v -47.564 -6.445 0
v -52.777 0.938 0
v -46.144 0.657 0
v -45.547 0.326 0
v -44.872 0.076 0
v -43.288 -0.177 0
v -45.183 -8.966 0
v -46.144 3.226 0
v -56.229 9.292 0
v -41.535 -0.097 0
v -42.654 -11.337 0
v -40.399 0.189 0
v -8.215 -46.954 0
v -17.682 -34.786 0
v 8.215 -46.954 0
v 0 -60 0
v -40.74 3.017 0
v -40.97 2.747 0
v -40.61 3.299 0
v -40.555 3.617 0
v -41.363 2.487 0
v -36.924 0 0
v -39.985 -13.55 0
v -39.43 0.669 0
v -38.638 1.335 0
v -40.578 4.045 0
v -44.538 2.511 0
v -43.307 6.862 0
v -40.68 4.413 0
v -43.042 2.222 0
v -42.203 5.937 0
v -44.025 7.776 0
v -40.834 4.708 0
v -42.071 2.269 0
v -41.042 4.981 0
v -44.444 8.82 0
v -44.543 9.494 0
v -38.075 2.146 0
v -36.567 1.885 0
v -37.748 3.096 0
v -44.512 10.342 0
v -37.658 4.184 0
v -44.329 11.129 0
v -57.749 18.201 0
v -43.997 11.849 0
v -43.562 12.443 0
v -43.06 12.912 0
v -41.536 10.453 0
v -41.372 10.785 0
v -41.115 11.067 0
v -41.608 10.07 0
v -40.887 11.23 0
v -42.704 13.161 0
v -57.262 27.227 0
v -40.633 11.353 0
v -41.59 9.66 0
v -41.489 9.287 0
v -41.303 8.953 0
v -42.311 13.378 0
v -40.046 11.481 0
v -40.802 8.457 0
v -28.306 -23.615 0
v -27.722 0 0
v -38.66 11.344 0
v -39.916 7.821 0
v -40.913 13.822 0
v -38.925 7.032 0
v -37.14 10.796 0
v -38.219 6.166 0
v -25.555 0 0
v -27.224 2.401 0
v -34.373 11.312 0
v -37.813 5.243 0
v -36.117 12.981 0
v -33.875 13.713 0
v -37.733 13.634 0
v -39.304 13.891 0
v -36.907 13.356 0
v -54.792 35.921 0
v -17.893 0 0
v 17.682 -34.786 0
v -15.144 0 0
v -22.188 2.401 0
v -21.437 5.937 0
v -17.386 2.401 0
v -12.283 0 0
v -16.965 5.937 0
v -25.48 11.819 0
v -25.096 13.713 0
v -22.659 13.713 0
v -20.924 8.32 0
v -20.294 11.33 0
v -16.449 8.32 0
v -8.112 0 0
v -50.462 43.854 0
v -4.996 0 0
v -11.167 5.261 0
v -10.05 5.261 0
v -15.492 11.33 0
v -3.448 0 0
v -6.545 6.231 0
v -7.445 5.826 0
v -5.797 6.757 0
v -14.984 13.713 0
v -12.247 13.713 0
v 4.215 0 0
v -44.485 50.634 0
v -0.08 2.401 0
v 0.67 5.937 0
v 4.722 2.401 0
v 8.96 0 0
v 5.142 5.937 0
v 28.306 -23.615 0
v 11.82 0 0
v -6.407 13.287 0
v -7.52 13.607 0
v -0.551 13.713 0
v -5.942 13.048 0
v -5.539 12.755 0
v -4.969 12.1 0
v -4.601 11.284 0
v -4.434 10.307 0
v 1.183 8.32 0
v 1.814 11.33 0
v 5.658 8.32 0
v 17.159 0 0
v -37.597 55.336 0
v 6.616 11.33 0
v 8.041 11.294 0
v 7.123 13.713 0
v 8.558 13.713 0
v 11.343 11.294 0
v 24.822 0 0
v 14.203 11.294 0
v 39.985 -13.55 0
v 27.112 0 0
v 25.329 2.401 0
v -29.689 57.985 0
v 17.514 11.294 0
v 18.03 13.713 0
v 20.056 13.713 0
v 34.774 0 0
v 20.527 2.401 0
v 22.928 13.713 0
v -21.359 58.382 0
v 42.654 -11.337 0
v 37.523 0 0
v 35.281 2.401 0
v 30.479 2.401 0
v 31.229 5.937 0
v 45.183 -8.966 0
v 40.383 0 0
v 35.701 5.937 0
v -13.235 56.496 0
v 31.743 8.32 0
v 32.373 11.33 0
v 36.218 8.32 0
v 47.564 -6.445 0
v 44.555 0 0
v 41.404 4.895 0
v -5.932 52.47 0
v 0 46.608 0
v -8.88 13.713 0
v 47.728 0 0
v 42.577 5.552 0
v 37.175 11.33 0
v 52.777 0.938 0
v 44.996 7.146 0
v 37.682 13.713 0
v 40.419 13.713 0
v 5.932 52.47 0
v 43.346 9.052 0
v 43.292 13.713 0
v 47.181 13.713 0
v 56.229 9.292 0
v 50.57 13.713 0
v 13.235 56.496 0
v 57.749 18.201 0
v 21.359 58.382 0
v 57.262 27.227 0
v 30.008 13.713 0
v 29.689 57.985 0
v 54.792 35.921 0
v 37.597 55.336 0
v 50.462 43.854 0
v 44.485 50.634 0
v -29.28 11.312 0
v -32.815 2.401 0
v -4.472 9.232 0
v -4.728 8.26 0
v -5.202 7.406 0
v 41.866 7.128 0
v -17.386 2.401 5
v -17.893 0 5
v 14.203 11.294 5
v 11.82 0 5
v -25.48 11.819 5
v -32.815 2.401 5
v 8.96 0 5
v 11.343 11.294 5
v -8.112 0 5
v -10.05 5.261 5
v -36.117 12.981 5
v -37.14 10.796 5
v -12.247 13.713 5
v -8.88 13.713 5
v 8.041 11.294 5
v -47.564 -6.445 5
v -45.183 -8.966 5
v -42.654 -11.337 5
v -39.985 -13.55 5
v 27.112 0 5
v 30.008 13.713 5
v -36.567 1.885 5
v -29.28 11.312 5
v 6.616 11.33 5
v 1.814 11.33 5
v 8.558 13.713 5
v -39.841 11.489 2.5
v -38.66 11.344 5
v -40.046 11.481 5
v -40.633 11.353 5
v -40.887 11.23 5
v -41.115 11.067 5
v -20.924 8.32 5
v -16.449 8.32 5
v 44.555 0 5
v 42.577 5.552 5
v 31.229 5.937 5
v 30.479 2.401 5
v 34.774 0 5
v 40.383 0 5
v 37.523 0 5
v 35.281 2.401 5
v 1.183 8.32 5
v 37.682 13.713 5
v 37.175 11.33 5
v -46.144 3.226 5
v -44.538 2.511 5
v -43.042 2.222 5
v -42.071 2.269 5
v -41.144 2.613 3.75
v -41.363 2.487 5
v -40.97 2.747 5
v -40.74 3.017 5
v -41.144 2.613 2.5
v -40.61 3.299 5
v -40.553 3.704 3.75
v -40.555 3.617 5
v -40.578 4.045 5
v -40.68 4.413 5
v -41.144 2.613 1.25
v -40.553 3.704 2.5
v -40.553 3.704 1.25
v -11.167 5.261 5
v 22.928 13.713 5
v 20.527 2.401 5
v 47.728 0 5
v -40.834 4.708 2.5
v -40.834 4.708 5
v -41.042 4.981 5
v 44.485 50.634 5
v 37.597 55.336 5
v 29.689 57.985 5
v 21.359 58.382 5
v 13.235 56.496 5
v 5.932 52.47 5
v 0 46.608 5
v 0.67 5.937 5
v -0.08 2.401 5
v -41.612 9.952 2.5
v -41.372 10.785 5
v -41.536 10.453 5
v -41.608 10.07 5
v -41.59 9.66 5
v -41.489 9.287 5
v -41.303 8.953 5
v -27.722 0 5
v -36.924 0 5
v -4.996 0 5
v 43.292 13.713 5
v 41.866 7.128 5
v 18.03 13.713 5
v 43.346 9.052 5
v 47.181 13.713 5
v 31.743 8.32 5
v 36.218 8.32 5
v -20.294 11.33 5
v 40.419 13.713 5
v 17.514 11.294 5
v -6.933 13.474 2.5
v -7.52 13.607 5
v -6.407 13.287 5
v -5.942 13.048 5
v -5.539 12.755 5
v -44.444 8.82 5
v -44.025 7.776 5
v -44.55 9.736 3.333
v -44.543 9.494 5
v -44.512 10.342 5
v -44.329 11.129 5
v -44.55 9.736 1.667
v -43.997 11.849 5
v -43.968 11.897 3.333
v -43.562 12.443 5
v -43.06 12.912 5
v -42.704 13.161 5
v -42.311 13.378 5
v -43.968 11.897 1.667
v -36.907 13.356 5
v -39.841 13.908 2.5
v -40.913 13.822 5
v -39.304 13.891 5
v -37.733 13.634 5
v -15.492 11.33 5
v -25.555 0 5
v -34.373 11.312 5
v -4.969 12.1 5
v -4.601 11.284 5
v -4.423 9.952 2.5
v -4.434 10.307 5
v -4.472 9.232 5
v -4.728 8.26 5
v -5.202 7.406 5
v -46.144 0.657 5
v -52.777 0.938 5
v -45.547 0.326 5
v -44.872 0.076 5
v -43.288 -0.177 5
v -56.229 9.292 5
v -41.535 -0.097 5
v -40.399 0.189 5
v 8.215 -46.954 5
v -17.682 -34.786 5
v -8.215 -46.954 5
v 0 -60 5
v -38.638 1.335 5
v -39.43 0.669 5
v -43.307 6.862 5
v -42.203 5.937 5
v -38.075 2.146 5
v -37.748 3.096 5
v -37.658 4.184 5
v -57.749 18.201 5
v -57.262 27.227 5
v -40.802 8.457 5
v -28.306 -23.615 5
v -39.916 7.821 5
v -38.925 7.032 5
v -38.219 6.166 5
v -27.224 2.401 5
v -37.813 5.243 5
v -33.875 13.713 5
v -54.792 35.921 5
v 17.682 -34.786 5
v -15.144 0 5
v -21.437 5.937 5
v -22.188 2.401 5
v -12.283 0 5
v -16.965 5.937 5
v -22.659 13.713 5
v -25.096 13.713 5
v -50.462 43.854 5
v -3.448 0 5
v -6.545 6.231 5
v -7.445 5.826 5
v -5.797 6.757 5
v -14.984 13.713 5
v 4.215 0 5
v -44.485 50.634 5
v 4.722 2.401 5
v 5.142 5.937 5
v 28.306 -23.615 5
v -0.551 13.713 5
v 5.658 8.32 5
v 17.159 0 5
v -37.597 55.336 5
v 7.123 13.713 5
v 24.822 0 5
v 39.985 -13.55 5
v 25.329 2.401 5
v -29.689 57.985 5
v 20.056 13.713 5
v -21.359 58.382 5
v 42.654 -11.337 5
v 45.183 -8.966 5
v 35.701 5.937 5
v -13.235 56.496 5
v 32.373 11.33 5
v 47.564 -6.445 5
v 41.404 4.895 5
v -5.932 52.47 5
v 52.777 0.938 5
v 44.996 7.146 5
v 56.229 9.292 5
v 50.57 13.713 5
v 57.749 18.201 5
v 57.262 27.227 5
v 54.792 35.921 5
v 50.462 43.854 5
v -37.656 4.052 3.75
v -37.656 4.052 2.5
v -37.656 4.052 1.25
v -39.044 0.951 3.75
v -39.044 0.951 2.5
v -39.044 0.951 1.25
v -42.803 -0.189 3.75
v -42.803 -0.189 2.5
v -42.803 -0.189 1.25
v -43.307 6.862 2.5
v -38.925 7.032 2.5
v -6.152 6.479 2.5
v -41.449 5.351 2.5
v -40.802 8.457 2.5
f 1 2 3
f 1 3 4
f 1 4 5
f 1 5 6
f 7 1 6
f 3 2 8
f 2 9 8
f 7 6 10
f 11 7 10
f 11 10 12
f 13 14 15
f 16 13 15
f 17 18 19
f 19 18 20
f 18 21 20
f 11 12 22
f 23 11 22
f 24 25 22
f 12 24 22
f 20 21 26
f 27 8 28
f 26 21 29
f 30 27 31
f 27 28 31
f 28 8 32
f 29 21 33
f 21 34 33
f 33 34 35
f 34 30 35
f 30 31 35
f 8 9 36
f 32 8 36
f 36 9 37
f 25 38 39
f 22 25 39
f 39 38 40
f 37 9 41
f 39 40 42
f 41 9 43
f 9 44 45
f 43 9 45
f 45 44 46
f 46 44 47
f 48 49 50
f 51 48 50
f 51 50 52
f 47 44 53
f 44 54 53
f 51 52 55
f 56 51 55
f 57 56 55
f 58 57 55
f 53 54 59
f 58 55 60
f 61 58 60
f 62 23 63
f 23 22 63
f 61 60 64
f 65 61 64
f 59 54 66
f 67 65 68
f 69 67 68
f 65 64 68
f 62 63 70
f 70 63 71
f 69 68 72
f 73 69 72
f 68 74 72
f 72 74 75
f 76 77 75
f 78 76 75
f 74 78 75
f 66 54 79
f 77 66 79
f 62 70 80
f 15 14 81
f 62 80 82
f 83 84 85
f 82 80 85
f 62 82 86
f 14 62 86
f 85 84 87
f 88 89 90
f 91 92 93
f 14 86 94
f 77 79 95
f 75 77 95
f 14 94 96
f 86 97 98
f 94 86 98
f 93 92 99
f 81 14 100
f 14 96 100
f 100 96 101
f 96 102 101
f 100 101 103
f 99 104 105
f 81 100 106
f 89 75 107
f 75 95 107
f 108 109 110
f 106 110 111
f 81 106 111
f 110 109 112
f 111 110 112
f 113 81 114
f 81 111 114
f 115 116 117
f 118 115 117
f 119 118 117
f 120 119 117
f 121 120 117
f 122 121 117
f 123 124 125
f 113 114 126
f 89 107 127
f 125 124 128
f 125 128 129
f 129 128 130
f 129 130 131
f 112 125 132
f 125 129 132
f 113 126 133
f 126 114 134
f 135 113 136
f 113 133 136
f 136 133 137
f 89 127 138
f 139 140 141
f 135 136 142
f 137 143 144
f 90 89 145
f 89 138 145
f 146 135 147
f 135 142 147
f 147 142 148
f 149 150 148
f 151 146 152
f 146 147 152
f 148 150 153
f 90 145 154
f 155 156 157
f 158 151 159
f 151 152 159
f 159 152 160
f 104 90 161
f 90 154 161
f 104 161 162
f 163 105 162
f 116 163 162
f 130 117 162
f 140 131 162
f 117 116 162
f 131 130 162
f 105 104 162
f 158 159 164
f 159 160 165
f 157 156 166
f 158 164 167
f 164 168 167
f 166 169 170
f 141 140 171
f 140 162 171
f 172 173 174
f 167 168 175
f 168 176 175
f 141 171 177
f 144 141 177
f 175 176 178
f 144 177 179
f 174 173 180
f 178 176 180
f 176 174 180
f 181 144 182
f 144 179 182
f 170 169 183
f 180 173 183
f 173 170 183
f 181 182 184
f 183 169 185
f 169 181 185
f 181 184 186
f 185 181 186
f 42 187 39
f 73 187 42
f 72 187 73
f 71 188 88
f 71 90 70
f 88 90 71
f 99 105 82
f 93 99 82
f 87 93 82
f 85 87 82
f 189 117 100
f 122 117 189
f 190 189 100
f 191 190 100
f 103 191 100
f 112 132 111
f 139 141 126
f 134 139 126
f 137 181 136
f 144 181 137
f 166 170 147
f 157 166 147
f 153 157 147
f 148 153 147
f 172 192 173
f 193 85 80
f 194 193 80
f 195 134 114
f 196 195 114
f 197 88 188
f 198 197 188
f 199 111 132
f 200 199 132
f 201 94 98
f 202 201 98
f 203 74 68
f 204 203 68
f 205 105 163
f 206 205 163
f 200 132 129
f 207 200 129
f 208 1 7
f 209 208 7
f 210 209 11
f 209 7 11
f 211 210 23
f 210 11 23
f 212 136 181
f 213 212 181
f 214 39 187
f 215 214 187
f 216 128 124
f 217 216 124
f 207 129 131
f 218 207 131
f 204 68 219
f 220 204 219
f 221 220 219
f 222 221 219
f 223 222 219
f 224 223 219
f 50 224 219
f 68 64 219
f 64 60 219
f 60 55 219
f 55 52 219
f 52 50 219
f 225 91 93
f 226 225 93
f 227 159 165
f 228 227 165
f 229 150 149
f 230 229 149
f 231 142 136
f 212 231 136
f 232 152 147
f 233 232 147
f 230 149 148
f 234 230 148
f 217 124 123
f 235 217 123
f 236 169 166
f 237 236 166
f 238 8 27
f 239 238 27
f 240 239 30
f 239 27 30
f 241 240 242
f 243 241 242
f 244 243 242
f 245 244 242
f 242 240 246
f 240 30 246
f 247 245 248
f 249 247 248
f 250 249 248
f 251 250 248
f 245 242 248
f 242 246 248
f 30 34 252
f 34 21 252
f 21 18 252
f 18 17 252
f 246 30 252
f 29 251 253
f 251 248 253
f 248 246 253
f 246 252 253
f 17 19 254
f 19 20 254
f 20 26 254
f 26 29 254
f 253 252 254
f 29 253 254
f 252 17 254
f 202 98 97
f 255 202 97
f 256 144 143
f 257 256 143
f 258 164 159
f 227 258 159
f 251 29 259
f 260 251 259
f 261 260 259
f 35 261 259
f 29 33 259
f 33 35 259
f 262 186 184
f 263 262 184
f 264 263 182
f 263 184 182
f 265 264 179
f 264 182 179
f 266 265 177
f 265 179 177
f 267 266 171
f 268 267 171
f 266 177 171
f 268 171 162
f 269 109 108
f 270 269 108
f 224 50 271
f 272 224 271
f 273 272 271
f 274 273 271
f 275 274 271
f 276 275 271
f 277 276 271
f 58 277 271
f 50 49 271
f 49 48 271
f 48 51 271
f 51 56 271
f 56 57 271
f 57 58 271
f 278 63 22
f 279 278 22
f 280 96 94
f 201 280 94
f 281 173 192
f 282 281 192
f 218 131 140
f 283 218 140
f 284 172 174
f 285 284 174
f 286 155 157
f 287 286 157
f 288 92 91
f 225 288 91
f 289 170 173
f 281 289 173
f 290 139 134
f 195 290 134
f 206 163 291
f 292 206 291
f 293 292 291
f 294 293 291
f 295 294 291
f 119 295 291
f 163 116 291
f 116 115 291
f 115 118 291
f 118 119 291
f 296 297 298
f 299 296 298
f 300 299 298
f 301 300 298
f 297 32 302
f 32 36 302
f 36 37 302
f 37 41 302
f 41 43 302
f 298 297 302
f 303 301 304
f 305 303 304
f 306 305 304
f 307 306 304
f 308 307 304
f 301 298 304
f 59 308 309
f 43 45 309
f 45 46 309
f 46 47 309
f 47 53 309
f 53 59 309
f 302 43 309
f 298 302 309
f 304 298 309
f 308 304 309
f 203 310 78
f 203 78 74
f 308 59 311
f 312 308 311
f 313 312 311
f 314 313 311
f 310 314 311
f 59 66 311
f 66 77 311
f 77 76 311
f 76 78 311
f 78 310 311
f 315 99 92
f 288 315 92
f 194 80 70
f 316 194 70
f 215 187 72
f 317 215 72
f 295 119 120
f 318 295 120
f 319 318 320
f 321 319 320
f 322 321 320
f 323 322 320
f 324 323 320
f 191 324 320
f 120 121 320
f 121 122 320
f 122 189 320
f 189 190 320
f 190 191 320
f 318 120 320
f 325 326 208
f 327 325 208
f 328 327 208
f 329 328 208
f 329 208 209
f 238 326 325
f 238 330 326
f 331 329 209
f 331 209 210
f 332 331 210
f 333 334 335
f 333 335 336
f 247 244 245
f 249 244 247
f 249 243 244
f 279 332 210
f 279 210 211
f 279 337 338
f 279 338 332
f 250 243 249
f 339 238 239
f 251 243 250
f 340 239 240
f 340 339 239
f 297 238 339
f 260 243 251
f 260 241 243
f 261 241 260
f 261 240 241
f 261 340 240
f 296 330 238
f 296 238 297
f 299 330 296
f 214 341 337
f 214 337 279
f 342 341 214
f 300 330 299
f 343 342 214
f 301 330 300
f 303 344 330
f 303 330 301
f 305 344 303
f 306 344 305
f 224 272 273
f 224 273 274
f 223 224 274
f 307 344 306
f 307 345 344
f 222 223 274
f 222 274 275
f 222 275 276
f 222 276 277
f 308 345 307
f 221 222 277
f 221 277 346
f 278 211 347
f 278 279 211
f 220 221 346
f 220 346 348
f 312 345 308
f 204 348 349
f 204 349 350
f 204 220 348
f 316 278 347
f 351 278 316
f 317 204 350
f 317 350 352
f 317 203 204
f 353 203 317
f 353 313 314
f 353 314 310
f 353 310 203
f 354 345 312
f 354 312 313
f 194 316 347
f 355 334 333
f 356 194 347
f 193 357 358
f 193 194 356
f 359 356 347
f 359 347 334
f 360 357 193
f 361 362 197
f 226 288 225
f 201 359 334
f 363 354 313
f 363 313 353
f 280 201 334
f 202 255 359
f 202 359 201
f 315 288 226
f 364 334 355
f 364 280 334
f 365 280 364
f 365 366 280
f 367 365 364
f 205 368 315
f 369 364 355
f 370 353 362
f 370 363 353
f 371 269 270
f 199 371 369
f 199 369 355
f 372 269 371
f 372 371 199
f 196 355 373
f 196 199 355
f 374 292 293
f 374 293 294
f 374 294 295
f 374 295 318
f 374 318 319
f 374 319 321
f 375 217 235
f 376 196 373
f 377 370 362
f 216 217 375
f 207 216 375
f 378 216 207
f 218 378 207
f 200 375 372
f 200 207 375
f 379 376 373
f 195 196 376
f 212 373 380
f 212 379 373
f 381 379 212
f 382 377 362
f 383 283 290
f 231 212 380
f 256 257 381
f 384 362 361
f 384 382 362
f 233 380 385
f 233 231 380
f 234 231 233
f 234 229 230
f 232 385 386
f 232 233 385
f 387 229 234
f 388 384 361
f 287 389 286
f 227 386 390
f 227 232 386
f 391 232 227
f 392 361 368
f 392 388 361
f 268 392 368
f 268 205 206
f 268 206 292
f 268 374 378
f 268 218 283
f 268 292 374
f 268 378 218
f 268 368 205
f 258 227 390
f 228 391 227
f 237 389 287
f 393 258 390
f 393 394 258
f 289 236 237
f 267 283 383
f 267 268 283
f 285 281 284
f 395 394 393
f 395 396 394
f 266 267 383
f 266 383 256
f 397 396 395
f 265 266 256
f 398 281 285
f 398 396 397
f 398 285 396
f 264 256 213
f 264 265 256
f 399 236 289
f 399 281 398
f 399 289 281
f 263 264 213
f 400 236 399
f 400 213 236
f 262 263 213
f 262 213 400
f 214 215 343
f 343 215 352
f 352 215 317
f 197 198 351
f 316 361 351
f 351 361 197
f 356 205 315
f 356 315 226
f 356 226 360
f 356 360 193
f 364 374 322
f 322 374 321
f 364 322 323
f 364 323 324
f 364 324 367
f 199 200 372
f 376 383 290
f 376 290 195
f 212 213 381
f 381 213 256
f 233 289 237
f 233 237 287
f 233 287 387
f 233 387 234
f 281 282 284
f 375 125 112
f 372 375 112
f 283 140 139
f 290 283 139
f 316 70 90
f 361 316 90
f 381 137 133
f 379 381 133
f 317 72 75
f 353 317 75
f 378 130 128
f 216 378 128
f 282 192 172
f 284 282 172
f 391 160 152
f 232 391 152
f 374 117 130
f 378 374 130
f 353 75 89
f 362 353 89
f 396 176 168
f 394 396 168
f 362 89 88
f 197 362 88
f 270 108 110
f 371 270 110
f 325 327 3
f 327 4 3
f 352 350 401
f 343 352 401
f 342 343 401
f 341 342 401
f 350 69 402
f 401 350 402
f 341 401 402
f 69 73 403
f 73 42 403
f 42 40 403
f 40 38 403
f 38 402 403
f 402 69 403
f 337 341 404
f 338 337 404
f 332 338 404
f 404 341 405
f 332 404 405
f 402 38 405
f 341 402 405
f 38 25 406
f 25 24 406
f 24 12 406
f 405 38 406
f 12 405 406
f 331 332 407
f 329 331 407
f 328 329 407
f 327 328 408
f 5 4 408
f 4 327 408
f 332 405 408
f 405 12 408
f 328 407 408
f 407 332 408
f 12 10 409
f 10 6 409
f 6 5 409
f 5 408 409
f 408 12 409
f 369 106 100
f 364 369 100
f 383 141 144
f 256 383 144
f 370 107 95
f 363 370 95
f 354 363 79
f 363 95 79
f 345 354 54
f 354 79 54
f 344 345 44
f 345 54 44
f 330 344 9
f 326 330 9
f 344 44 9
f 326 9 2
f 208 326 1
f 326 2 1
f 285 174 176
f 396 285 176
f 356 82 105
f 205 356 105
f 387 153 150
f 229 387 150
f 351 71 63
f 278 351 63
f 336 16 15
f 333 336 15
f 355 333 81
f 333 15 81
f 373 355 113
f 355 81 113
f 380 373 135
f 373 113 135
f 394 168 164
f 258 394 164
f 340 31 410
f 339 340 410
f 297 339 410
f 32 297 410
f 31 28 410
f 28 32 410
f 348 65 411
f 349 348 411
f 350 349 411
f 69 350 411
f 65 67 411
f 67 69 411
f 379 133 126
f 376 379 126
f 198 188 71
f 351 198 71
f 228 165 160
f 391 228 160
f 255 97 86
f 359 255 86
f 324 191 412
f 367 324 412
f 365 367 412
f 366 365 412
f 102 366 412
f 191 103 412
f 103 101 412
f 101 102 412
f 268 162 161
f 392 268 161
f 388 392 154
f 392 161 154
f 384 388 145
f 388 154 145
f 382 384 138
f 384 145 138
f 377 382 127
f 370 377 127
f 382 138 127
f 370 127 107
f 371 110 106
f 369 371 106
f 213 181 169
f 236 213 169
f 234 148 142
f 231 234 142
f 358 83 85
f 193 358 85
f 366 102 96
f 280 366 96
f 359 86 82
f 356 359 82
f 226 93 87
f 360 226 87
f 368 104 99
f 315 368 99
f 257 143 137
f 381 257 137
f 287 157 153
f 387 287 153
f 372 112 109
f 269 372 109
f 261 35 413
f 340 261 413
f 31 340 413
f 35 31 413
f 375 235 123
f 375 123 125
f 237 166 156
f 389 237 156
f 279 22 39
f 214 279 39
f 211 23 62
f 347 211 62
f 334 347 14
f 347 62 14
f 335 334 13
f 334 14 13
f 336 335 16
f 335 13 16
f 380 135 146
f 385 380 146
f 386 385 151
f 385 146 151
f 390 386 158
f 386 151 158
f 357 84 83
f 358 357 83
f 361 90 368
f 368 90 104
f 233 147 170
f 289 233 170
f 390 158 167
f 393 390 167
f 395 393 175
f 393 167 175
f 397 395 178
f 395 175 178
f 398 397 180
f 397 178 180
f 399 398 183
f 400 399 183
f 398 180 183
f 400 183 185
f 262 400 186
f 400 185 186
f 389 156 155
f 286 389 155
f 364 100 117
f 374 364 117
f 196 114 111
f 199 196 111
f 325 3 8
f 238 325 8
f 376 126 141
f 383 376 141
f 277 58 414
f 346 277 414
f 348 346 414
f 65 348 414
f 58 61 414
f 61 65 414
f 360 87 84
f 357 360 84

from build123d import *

# Parameters (mm, degrees)
F1_DEPTH = 5


with BuildPart() as f1:
    # F0 (on Top) → F1 (new body)
    with BuildSketch(Plane.XY):
        with BuildLine():
            ThreePointArc((39.9847812951, -13.5503625497), (43.9367876921, -10.1710657097), (47.5637614727, -6.445067469))
            ThreePointArc((47.5637614727, -6.445067469), (57.7574296409, 22.7274453414), (44.4848015904, 50.6341420114))
            ThreePointArc((44.4848015904, 50.6341420114), (21.3589499339, 58.3817468835), (0, 46.6078072786))
            ThreePointArc((0, 46.6078072786), (-21.3589499339, 58.3817468835), (-44.4848015904, 50.6341420114))
            ThreePointArc((-44.4848015904, 50.6341420114), (-57.7574296409, 22.7274453414), (-47.5637614727, -6.445067469))
            ThreePointArc((-47.5637614727, -6.445067469), (-43.9367876921, -10.1710657097), (-39.9847812951, -13.5503625497))
            ThreePointArc((-39.9847812951, -13.5503625497), (-17.6817313741, -34.786119341), (0, -60))
            ThreePointArc((0, -60), (17.6817313741, -34.786119341), (39.9847812951, -13.5503625497))
        make_face()
        with BuildLine():
            add(Edge.make_bspline(
                [(-38.2190007028, 6.1661579287), (-37.656258132, 5.2612678749), (-37.656258132, 4.0517465095)],
                knots=[0, 0, 0, 1, 1, 1], degree=2))
            add(Edge.make_bspline(
                [(-37.656258132, 4.0517465095), (-37.656258132, 2.0919017164), (-39.0443564732, 0.9514101063)],
                knots=[0, 0, 0, 1, 1, 1], degree=2))
            add(Edge.make_bspline(
                [(-39.0443564732, 0.9514101063), (-40.4324548144, -0.1890815038), (-42.8034768459, -0.1890815038)],
                knots=[0, 0, 0, 1, 1, 1], degree=2))
            add(Edge.make_bspline(
                [(-42.8034768459, -0.1890815038), (-44.8773708, -0.1890815038), (-46.143916746, 0.6572833227)],
                knots=[0, 0, 0, 1, 1, 1], degree=2))
            Line((-46.143916746, 0.6572833227), (-46.143916746, 3.226390739))
            add(Edge.make_bspline(
                [(-46.143916746, 3.226390739), (-44.3341366384, 2.2149547585), (-42.7854690837, 2.2149547585)],
                knots=[0, 0, 0, 1, 1, 1], degree=2))
            add(Edge.make_bspline(
                [(-42.7854690837, 2.2149547585), (-41.7350162849, 2.2149547585), (-41.1437614239, 2.6126261752)],
                knots=[0, 0, 0, 1, 1, 1], degree=2))
            add(Edge.make_bspline(
                [(-41.1437614239, 2.6126261752), (-40.5525065629, 3.0102975919), (-40.5525065629, 3.7035964391)],
                knots=[0, 0, 0, 1, 1, 1], degree=2))
            add(Edge.make_bspline(
                [(-40.5525065629, 3.7035964391), (-40.5525065629, 4.10877109), (-40.6800615456, 4.4134024016)],
                knots=[0, 0, 0, 1, 1, 1], degree=2))
            add(Edge.make_bspline(
                [(-40.6800615456, 4.4134024016), (-40.8076165283, 4.7180337133), (-41.0417174377, 4.980646913)],
                knots=[0, 0, 0, 1, 1, 1], degree=2))
            add(Edge.make_bspline(
                [(-41.0417174377, 4.980646913), (-41.2758183472, 5.2432601127), (-42.2032181038, 5.9365589599)],
                knots=[0, 0, 0, 1, 1, 1], degree=2))
            add(Edge.make_bspline(
                [(-42.2032181038, 5.9365589599), (-43.4997769868, 6.8669600102), (-44.0250033862, 7.7763520045)],
                knots=[0, 0, 0, 1, 1, 1], degree=2))
            add(Edge.make_bspline(
                [(-44.0250033862, 7.7763520045), (-44.5502297856, 8.6857439989), (-44.5502297856, 9.7361967977)],
                knots=[0, 0, 0, 1, 1, 1], degree=2))
            add(Edge.make_bspline(
                [(-44.5502297856, 9.7361967977), (-44.5502297856, 10.9457181631), (-43.9679788057, 11.8971282694)],
                knots=[0, 0, 0, 1, 1, 1], degree=2))
            add(Edge.make_bspline(
                [(-43.9679788057, 11.8971282694), (-43.3857278258, 12.8485383757), (-42.3112646774, 13.3782667156)],
                knots=[0, 0, 0, 1, 1, 1], degree=2))
            add(Edge.make_bspline(
                [(-42.3112646774, 13.3782667156), (-41.2368015289, 13.9079950556), (-39.8411999534, 13.9079950556)],
                knots=[0, 0, 0, 1, 1, 1], degree=2))
            add(Edge.make_bspline(
                [(-39.8411999534, 13.9079950556), (-37.8063228175, 13.9079950556), (-36.1165944584, 12.980595299)],
                knots=[0, 0, 0, 1, 1, 1], degree=2))
            Line((-36.1165944584, 12.980595299), (-37.1400356138, 10.7956534775))
            add(Edge.make_bspline(
                [(-37.1400356138, 10.7956534775), (-38.6016656509, 11.4889523247), (-39.8411999534, 11.4889523247)],
                knots=[0, 0, 0, 1, 1, 1], degree=2))
            add(Edge.make_bspline(
                [(-39.8411999534, 11.4889523247), (-40.6185350245, 11.4889523247), (-41.1152491336, 11.0672705584)],
                knots=[0, 0, 0, 1, 1, 1], degree=2))
            add(Edge.make_bspline(
                [(-41.1152491336, 11.0672705584), (-41.6119632428, 10.645588792), (-41.6119632428, 9.9522899448)],
                knots=[0, 0, 0, 1, 1, 1], degree=2))
            add(Edge.make_bspline(
                [(-41.6119632428, 9.9522899448), (-41.6119632428, 9.3790428461), (-41.3028299906, 8.9528591391)],
                knots=[0, 0, 0, 1, 1, 1], degree=2))
            add(Edge.make_bspline(
                [(-41.3028299906, 8.9528591391), (-40.9936967383, 8.5266754322), (-39.9162322962, 7.8213714102)],
                knots=[0, 0, 0, 1, 1, 1], degree=2))
            add(Edge.make_bspline(
                [(-39.9162322962, 7.8213714102), (-38.7817432735, 7.0710479825), (-38.2190007028, 6.1661579287)],
                knots=[0, 0, 0, 1, 1, 1], degree=2))
        make_face(mode=Mode.SUBTRACT)
        Polygon((-27.2237611935, 2.4010349686), (-27.7219759494, 0), (-36.9239424666, 0), (-36.566788515, 1.8848124503), (-29.2796473853, 11.3118759958), (-34.3728428124, 11.3118759958), (-33.8746280565, 13.7129109644), (-25.0958439525, 13.7129109644), (-25.4800095475, 11.8190946329), (-32.8151713766, 2.4010349686), align=None, mode=Mode.SUBTRACT)
        Polygon((-17.3855204096, 2.4010349686), (-17.8927390468, 0), (-25.5550418903, 0), (-22.6587934594, 13.7129109644), (-14.984485441, 13.7129109644), (-15.4917040782, 11.3298837581), (-20.2937740153, 11.3298837581), (-20.9240456946, 8.3195861662), (-16.4491167719, 8.3195861662), (-16.9653392901, 5.9365589599), (-21.4372669191, 5.9365589599), (-22.1875903468, 2.4010349686), align=None, mode=Mode.SUBTRACT)
        with BuildLine():
            Line((-10.0503585806, 5.2612678749), (-11.166839841, 5.2612678749))
            Line((-11.166839841, 5.2612678749), (-12.2833211014, 0))
            Line((-12.2833211014, 0), (-15.1435540077, 0))
            Line((-15.1435540077, 0), (-12.2473055768, 13.7129109644))
            Line((-12.2473055768, 13.7129109644), (-8.8798540334, 13.7129109644))
            add(Edge.make_bspline(
                [(-8.8798540334, 13.7129109644), (-6.6558953937, 13.7129109644), (-5.5394141333, 12.7554982707)],
                knots=[0, 0, 0, 1, 1, 1], degree=2))
            add(Edge.make_bspline(
                [(-5.5394141333, 12.7554982707), (-4.4229328729, 11.7980855769), (-4.4229328729, 9.9522899448)],
                knots=[0, 0, 0, 1, 1, 1], degree=2))
            add(Edge.make_bspline(
                [(-4.4229328729, 9.9522899448), (-4.4229328729, 8.4696508517), (-5.2017685909, 7.4056922313)],
                knots=[0, 0, 0, 1, 1, 1], degree=2))
            add(Edge.make_bspline(
                [(-5.2017685909, 7.4056922313), (-5.9806043088, 6.3417336108), (-7.4452356397, 5.8255110926)],
                knots=[0, 0, 0, 1, 1, 1], degree=2))
            Line((-7.4452356397, 5.8255110926), (-4.9961799717, 0))
            Line((-4.9961799717, 0), (-8.1115228434, 0))
            Line((-8.1115228434, 0), (-10.0503585806, 5.2612678749))
        make_face(mode=Mode.SUBTRACT)
        Polygon((4.7220090637, 2.4010349686), (4.2147904266, 0), (-3.4475124169, 0), (-0.5512639861, 13.7129109644), (7.1230440323, 13.7129109644), (6.6158253952, 11.3298837581), (1.813755458, 11.3298837581), (1.1834837787, 8.3195861662), (5.6584127015, 8.3195861662), (5.1421901832, 5.9365589599), (0.6702625542, 5.9365589599), (-0.0800608735, 2.4010349686), align=None, mode=Mode.SUBTRACT)
        Polygon((14.2030958959, 11.2938682335), (11.8200686896, 0), (8.9598357833, 0), (11.3428629896, 11.2938682335), (8.0414399078, 11.2938682335), (8.557662426, 13.7129109644), (18.0297453771, 13.7129109644), (17.5135228589, 11.2938682335), align=None, mode=Mode.SUBTRACT)
        Polygon((24.8216730445, 0), (17.159370201, 0), (20.0556186319, 13.7129109644), (22.9278567131, 13.7129109644), (20.5268217445, 2.4010349686), (25.3288916817, 2.4010349686), align=None, mode=Mode.SUBTRACT)
        Polygon((35.2811816265, 2.4010349686), (34.7739629894, 0), (27.1116601458, 0), (30.0079085767, 13.7129109644), (37.6822165951, 13.7129109644), (37.174997958, 11.3298837581), (32.3729280208, 11.3298837581), (31.7426563415, 8.3195861662), (36.2175852642, 8.3195861662), (35.701362746, 5.9365589599), (31.229435117, 5.9365589599), (30.4791116893, 2.4010349686), align=None, mode=Mode.SUBTRACT)
        Polygon((44.9963693682, 7.1460803253), (47.7275466449, 0), (44.5551791927, 0), (42.5773266373, 5.5523933649), (41.4038207964, 4.8951100422), (40.3833809348, 0), (37.5231480284, 0), (40.4193964593, 13.7129109644), (43.2916345405, 13.7129109644), (41.8660200279, 7.128072563), (43.3456578273, 9.0519018316), (47.1813111896, 13.7129109644), (50.569771789, 13.7129109644), align=None, mode=Mode.SUBTRACT)
    extrude(amount=F1_DEPTH)


solid = f1.part
